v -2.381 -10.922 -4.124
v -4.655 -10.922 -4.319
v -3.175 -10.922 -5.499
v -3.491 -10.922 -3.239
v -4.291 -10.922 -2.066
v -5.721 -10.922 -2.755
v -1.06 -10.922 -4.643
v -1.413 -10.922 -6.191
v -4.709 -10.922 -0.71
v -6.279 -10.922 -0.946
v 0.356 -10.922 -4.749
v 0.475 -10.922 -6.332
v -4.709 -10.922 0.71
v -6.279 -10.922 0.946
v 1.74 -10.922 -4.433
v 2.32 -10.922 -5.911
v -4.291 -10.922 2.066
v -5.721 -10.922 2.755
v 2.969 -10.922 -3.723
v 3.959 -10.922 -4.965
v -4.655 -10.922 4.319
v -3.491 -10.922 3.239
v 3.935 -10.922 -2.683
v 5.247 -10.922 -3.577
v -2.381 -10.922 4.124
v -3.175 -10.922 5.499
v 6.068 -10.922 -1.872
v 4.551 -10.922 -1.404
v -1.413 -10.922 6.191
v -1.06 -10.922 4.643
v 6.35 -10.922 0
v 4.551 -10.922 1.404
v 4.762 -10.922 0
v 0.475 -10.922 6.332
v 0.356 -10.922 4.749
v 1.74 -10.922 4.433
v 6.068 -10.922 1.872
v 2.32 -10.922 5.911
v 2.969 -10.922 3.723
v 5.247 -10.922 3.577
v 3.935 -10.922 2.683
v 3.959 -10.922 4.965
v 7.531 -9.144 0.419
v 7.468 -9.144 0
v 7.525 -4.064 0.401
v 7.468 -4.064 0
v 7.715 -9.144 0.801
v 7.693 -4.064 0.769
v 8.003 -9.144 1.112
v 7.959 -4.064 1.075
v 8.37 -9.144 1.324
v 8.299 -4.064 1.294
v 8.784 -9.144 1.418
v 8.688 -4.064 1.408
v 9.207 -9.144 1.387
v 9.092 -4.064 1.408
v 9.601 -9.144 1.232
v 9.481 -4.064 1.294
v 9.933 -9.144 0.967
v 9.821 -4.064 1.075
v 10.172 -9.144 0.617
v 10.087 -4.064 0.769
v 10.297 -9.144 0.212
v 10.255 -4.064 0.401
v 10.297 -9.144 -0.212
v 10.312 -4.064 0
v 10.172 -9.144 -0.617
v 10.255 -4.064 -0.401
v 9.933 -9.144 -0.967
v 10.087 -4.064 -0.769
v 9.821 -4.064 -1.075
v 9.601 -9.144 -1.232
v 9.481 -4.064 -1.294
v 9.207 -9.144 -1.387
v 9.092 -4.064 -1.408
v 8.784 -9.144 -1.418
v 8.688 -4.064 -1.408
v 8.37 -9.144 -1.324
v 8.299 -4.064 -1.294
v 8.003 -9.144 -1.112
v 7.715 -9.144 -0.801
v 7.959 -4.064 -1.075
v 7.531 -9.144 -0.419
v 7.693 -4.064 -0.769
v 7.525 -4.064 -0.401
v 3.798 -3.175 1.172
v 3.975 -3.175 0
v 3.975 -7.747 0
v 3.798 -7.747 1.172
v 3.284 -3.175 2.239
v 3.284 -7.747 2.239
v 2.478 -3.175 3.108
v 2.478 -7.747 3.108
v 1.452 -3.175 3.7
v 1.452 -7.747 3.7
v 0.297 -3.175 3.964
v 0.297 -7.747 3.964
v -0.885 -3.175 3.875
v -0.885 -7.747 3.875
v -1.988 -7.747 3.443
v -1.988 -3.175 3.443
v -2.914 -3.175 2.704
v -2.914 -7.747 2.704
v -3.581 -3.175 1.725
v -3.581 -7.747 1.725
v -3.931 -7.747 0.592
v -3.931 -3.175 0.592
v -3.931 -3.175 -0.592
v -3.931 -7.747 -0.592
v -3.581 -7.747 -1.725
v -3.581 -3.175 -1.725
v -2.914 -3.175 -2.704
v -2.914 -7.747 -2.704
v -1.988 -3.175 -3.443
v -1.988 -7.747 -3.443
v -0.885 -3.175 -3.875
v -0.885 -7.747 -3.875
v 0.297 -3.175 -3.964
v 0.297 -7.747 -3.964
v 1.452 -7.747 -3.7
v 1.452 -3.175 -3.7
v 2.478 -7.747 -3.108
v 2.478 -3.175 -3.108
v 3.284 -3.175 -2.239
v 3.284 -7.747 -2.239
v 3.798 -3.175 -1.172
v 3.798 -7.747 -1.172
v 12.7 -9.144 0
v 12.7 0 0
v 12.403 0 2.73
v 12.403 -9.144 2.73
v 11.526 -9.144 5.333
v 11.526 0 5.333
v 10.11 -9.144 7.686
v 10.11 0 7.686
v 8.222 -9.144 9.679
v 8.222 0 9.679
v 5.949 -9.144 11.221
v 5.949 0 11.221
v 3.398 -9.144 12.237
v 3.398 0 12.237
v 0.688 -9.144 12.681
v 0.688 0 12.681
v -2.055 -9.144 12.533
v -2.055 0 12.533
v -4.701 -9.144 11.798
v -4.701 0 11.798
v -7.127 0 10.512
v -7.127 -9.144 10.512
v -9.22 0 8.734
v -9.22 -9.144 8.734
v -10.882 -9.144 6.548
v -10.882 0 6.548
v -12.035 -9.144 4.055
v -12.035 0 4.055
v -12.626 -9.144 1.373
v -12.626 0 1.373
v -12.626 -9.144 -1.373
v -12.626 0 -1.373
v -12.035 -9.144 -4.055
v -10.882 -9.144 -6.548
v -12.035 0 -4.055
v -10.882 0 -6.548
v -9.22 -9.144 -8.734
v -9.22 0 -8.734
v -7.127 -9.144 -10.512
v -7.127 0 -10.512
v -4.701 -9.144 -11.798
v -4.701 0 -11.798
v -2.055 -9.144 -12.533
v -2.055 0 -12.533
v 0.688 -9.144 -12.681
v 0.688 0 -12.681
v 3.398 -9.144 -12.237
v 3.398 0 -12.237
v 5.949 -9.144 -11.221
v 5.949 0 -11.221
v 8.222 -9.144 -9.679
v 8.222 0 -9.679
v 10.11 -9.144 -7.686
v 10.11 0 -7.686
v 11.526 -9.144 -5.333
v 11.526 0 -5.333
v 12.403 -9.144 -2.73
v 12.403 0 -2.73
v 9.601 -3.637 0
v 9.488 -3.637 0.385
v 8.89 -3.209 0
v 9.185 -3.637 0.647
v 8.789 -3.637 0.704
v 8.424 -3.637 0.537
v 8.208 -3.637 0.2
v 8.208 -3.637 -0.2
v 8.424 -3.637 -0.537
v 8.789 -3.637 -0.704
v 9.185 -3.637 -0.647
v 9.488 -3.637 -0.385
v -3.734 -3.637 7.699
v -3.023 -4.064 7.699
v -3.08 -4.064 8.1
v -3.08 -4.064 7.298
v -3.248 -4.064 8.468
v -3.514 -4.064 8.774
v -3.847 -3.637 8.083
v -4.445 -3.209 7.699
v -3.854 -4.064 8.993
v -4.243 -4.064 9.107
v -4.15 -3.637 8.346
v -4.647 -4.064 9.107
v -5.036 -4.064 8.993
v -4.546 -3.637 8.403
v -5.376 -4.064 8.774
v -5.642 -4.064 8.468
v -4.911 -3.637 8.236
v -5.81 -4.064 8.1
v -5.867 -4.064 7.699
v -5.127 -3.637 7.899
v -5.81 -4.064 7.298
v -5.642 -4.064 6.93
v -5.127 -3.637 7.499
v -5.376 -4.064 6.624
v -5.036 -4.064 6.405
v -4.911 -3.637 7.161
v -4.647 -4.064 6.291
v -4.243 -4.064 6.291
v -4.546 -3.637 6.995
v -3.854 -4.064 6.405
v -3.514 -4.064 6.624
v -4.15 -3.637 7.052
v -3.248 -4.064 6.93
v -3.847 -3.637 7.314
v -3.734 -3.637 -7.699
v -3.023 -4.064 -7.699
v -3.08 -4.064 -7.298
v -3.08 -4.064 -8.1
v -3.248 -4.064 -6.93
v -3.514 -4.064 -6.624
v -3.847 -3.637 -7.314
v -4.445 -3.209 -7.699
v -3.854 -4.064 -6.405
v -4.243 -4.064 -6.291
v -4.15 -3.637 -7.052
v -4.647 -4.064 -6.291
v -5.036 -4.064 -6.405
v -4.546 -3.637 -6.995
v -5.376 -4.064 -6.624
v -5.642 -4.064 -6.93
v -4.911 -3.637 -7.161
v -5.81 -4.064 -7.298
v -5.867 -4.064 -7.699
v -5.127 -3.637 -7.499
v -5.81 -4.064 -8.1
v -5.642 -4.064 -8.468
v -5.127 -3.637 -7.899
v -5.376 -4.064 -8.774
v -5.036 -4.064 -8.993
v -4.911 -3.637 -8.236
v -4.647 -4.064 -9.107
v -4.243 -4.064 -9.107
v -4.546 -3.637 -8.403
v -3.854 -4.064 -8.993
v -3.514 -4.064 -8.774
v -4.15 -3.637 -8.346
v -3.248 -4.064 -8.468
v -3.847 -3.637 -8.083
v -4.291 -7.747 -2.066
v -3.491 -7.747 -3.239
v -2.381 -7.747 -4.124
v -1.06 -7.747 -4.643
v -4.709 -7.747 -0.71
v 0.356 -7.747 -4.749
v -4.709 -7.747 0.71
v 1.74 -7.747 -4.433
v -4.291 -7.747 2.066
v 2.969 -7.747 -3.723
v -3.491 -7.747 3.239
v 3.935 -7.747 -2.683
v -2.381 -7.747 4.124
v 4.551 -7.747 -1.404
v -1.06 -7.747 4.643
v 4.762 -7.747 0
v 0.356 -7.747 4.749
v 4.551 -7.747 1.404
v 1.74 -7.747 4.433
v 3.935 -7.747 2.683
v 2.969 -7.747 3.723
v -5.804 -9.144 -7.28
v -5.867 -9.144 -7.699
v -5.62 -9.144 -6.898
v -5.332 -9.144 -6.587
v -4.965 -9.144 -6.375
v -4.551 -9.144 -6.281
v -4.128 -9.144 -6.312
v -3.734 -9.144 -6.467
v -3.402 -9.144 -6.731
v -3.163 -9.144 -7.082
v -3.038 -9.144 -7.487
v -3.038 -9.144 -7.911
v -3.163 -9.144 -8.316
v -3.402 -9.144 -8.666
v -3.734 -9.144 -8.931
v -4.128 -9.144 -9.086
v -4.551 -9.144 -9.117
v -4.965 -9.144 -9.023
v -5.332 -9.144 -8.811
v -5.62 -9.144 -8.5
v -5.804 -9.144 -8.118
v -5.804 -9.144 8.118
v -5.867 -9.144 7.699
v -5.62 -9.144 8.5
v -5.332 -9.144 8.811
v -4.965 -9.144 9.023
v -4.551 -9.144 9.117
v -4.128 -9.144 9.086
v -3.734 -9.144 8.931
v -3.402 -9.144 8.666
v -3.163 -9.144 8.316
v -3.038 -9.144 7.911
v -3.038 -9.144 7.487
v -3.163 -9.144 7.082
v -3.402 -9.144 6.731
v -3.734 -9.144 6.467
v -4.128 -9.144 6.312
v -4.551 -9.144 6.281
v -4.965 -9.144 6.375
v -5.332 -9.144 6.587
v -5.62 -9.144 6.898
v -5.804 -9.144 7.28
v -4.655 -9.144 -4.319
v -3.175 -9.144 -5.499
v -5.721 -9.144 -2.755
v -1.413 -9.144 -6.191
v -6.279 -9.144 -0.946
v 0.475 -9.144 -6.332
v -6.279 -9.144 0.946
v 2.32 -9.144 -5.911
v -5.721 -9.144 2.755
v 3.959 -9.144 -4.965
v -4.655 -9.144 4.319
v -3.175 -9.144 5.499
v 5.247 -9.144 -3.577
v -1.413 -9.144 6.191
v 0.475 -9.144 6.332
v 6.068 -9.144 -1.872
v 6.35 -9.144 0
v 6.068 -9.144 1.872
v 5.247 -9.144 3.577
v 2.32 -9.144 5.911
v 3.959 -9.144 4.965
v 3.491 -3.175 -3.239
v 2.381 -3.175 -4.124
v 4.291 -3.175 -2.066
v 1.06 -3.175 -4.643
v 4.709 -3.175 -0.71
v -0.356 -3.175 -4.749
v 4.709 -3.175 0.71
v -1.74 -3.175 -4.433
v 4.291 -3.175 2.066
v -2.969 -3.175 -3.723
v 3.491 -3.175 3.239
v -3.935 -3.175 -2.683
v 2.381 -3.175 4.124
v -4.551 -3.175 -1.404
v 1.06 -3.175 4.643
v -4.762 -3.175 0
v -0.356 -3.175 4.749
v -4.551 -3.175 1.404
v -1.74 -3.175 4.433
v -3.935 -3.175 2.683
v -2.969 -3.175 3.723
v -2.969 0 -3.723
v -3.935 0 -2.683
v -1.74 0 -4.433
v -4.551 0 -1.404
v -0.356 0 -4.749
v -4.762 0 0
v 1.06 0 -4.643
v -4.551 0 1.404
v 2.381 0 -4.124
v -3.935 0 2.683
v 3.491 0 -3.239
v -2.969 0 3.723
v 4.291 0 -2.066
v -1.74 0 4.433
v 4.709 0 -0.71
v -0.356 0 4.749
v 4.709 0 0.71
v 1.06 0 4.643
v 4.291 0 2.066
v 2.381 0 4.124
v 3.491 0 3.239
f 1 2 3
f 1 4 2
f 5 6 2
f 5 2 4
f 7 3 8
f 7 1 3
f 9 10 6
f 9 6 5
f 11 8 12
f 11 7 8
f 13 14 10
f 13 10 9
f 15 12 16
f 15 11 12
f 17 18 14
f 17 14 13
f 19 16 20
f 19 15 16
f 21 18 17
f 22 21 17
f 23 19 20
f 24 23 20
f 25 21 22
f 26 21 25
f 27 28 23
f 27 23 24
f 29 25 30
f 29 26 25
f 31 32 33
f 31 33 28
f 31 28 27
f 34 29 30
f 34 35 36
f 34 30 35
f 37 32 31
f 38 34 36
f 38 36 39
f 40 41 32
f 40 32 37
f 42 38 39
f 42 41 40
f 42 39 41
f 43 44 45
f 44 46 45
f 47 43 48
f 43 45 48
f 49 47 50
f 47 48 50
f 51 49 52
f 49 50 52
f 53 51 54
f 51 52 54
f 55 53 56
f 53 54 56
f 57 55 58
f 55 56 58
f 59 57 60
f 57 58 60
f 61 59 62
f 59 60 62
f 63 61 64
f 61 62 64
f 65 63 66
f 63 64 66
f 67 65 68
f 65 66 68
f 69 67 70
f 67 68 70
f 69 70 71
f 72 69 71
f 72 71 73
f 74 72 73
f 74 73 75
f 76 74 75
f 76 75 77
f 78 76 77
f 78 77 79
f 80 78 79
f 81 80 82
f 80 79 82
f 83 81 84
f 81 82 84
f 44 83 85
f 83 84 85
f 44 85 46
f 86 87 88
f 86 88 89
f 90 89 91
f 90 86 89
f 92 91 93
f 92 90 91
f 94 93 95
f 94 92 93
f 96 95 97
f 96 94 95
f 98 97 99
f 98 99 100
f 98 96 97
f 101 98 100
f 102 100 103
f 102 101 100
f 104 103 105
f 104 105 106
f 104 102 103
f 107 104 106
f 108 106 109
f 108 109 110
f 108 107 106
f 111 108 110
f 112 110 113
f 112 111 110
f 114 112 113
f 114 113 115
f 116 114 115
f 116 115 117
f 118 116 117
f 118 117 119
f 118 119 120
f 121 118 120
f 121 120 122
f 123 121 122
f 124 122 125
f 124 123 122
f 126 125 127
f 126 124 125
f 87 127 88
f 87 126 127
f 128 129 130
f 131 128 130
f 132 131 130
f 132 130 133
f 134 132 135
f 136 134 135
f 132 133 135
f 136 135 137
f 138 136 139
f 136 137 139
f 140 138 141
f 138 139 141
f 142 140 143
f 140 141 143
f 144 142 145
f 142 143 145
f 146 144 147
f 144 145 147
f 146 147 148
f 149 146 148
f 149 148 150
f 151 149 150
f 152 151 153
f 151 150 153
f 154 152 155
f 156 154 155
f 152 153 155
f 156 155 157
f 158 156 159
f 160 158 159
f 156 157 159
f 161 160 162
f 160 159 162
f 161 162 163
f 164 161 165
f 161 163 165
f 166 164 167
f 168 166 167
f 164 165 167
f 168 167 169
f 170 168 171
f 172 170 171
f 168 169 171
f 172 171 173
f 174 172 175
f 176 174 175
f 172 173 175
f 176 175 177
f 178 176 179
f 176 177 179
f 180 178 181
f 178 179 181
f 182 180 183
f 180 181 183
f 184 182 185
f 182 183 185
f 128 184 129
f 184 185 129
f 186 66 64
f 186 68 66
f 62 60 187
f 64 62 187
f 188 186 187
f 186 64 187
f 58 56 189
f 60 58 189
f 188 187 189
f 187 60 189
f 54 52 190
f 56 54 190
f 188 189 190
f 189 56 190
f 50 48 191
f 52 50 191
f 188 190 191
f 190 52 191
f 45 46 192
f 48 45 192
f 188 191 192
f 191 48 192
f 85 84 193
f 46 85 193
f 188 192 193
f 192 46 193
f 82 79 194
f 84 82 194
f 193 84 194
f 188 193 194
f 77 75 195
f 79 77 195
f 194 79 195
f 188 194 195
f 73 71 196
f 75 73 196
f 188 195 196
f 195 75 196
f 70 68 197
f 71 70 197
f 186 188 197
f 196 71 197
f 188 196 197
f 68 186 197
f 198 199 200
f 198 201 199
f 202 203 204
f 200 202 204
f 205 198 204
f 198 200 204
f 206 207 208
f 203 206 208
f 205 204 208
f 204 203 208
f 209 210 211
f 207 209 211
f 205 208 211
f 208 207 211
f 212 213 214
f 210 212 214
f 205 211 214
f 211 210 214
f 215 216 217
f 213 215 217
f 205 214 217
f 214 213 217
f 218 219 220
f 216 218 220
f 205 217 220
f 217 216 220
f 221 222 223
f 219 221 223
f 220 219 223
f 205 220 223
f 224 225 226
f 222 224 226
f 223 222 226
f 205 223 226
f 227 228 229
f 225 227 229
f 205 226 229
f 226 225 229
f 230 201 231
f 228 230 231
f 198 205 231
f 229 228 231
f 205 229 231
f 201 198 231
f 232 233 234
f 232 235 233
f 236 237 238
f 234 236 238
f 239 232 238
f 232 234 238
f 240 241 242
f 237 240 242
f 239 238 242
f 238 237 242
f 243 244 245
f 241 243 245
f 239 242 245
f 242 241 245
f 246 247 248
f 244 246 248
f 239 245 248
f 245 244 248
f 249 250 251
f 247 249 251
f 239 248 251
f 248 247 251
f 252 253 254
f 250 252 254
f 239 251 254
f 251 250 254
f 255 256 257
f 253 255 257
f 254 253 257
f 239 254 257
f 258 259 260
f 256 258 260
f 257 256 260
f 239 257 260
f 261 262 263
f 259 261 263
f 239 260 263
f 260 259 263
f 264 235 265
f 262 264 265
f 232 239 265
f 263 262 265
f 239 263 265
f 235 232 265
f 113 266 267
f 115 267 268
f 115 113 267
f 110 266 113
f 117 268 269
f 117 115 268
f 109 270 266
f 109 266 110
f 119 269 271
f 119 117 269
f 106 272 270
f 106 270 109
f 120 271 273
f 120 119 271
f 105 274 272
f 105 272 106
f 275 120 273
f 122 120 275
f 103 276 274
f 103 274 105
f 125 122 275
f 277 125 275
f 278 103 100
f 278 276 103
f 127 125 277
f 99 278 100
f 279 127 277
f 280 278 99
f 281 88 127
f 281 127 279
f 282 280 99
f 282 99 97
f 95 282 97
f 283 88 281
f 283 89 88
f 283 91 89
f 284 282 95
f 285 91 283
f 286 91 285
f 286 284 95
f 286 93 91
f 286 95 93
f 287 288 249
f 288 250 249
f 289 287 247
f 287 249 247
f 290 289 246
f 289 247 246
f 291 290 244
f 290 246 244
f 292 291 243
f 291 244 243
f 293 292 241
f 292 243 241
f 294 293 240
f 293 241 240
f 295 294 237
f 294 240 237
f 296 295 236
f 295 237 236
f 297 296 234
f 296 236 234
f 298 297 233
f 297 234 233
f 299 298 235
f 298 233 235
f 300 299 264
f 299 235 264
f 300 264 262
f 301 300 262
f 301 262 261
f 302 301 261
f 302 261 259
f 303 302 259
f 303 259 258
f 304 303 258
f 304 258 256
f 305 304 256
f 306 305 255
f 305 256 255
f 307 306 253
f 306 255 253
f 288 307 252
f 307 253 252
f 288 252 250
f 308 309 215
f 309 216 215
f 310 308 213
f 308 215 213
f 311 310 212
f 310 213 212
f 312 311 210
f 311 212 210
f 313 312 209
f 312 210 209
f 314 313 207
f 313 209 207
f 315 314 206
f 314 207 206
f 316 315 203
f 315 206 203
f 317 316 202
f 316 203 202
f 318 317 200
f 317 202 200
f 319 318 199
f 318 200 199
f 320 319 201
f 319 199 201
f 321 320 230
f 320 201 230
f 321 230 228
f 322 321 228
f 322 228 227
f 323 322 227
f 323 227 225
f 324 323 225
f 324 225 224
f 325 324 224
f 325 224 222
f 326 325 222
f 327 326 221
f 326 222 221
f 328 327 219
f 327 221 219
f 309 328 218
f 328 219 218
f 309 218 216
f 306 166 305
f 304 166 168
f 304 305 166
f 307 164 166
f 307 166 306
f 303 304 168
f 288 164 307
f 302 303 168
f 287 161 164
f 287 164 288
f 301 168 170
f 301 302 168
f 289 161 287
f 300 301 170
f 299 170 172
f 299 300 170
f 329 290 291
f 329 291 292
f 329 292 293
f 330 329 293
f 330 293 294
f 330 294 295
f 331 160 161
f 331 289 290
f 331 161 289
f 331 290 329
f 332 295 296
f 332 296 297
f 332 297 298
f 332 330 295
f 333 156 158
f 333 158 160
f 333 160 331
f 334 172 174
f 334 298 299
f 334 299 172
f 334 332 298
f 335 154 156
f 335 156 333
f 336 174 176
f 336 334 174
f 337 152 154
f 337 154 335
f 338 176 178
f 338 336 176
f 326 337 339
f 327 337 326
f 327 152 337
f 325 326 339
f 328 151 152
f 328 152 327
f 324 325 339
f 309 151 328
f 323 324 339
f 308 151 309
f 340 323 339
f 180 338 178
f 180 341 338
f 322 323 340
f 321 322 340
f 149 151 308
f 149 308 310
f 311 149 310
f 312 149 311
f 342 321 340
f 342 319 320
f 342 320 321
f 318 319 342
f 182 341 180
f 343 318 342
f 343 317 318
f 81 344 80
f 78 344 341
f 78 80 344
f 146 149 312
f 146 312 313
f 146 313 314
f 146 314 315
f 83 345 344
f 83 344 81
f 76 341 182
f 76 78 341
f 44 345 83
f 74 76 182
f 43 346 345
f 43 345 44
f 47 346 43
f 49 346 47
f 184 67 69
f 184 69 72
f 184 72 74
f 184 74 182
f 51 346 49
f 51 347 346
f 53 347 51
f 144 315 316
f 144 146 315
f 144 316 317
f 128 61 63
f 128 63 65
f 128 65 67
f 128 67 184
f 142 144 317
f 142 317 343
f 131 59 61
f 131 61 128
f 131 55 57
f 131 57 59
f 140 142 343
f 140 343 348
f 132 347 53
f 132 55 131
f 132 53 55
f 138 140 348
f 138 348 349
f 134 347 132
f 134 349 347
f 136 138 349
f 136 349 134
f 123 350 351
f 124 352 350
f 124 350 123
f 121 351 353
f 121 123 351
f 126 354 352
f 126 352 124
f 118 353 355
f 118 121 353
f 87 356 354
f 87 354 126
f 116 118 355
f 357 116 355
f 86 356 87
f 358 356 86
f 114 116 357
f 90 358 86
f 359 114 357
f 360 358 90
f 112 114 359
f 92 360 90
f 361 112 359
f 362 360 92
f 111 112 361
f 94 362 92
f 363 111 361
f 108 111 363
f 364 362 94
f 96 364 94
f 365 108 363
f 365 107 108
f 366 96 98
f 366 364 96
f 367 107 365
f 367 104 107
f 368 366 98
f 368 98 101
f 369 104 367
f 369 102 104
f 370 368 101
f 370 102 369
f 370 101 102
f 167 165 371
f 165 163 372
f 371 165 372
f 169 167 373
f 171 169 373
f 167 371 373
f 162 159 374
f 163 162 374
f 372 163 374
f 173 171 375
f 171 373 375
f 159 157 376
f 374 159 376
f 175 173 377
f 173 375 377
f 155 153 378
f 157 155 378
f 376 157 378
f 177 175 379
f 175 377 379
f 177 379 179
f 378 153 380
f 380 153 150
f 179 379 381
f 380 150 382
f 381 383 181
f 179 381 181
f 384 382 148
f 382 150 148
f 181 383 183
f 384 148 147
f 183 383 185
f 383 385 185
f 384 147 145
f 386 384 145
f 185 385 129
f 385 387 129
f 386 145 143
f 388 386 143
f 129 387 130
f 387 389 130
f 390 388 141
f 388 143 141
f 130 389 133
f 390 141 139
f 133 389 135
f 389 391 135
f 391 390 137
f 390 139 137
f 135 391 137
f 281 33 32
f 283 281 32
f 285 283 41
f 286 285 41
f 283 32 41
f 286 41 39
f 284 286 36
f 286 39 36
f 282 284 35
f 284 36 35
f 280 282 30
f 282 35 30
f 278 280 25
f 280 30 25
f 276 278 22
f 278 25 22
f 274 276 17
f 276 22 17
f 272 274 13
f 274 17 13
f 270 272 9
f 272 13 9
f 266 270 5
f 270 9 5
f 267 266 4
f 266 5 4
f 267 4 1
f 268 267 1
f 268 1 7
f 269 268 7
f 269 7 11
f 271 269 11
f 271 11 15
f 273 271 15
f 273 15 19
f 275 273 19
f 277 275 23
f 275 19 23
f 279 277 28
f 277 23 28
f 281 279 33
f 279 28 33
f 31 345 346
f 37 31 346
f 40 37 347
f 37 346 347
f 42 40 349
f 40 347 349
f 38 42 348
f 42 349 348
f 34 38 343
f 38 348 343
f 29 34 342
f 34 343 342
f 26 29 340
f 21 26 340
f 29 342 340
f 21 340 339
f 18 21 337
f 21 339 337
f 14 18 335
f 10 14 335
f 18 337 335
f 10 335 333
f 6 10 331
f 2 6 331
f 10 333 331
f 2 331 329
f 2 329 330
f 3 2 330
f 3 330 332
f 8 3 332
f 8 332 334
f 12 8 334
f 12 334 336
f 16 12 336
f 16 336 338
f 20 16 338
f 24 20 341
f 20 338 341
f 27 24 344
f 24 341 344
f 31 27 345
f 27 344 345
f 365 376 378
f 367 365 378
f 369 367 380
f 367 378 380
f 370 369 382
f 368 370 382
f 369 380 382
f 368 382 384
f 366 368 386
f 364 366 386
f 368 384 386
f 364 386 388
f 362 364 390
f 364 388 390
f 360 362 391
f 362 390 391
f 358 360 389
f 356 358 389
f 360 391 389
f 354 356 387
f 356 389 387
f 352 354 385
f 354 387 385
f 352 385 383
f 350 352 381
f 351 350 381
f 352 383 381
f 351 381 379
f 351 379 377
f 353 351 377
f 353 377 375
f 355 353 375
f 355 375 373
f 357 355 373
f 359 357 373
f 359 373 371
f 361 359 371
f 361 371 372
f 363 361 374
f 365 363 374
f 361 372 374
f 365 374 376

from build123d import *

# Parameters (mm, degrees)
F0_R     = 12.7
F0_R_2   = 3.9751
F1_DEPTH = 9.144
F2_R     = 6.35
F2_R_2   = 3.9751
F3_DEPTH = 1.778
F4_R     = 4.7625
F4_R_2   = 3.9751
F5_DEPTH = 3.175
F6_R     = 4.7625
F6_R_2   = 3.9751
F7_DEPTH = 3.175
F9_D     = 2.8448
F9_DEPTH = 5.08
F9_TIP   = 0.8546641445


with BuildPart() as f1:
    # F0 (on Front) → F1 (new body)
    with BuildSketch(Plane.XZ):
        Circle(F0_R)
        Circle(F0_R_2, mode=Mode.SUBTRACT)
    extrude(amount=F1_DEPTH)

    # F2 (on face) → F3 (join)
    with BuildSketch(Plane.XZ.offset(9.144)):
        Circle(F2_R)
        Circle(F2_R_2, mode=Mode.SUBTRACT)
    extrude(amount=F3_DEPTH)

    # F4 (on face) → F5 (cut)
    with BuildSketch(Plane.XZ.offset(10.922)):
        Circle(F4_R)
        Circle(F4_R_2, mode=Mode.SUBTRACT)
    extrude(amount=-F5_DEPTH, mode=Mode.SUBTRACT)

    # F6 (on face) → F7 (cut)
    with BuildSketch(Plane(origin=(0, 0, 0), x_dir=(-1, 0, 0), z_dir=(0, 1, 0))):
        Circle(F6_R)
        Circle(F6_R_2, mode=Mode.SUBTRACT)
    extrude(amount=-F7_DEPTH, mode=Mode.SUBTRACT)

    # F9
    with Locations(Plane.XZ.offset(9.144)):
        with Locations((8.89, 0), (-4.445, 7.6989658396), (-4.445, -7.6989658396)):
            Hole(F9_D / 2, depth=F9_DEPTH)
            with Locations((0, 0, -(F9_DEPTH + F9_TIP / 2))):  # 118° drill point
                Cone(0, F9_D / 2, F9_TIP, mode=Mode.SUBTRACT)


solid = f1.part
